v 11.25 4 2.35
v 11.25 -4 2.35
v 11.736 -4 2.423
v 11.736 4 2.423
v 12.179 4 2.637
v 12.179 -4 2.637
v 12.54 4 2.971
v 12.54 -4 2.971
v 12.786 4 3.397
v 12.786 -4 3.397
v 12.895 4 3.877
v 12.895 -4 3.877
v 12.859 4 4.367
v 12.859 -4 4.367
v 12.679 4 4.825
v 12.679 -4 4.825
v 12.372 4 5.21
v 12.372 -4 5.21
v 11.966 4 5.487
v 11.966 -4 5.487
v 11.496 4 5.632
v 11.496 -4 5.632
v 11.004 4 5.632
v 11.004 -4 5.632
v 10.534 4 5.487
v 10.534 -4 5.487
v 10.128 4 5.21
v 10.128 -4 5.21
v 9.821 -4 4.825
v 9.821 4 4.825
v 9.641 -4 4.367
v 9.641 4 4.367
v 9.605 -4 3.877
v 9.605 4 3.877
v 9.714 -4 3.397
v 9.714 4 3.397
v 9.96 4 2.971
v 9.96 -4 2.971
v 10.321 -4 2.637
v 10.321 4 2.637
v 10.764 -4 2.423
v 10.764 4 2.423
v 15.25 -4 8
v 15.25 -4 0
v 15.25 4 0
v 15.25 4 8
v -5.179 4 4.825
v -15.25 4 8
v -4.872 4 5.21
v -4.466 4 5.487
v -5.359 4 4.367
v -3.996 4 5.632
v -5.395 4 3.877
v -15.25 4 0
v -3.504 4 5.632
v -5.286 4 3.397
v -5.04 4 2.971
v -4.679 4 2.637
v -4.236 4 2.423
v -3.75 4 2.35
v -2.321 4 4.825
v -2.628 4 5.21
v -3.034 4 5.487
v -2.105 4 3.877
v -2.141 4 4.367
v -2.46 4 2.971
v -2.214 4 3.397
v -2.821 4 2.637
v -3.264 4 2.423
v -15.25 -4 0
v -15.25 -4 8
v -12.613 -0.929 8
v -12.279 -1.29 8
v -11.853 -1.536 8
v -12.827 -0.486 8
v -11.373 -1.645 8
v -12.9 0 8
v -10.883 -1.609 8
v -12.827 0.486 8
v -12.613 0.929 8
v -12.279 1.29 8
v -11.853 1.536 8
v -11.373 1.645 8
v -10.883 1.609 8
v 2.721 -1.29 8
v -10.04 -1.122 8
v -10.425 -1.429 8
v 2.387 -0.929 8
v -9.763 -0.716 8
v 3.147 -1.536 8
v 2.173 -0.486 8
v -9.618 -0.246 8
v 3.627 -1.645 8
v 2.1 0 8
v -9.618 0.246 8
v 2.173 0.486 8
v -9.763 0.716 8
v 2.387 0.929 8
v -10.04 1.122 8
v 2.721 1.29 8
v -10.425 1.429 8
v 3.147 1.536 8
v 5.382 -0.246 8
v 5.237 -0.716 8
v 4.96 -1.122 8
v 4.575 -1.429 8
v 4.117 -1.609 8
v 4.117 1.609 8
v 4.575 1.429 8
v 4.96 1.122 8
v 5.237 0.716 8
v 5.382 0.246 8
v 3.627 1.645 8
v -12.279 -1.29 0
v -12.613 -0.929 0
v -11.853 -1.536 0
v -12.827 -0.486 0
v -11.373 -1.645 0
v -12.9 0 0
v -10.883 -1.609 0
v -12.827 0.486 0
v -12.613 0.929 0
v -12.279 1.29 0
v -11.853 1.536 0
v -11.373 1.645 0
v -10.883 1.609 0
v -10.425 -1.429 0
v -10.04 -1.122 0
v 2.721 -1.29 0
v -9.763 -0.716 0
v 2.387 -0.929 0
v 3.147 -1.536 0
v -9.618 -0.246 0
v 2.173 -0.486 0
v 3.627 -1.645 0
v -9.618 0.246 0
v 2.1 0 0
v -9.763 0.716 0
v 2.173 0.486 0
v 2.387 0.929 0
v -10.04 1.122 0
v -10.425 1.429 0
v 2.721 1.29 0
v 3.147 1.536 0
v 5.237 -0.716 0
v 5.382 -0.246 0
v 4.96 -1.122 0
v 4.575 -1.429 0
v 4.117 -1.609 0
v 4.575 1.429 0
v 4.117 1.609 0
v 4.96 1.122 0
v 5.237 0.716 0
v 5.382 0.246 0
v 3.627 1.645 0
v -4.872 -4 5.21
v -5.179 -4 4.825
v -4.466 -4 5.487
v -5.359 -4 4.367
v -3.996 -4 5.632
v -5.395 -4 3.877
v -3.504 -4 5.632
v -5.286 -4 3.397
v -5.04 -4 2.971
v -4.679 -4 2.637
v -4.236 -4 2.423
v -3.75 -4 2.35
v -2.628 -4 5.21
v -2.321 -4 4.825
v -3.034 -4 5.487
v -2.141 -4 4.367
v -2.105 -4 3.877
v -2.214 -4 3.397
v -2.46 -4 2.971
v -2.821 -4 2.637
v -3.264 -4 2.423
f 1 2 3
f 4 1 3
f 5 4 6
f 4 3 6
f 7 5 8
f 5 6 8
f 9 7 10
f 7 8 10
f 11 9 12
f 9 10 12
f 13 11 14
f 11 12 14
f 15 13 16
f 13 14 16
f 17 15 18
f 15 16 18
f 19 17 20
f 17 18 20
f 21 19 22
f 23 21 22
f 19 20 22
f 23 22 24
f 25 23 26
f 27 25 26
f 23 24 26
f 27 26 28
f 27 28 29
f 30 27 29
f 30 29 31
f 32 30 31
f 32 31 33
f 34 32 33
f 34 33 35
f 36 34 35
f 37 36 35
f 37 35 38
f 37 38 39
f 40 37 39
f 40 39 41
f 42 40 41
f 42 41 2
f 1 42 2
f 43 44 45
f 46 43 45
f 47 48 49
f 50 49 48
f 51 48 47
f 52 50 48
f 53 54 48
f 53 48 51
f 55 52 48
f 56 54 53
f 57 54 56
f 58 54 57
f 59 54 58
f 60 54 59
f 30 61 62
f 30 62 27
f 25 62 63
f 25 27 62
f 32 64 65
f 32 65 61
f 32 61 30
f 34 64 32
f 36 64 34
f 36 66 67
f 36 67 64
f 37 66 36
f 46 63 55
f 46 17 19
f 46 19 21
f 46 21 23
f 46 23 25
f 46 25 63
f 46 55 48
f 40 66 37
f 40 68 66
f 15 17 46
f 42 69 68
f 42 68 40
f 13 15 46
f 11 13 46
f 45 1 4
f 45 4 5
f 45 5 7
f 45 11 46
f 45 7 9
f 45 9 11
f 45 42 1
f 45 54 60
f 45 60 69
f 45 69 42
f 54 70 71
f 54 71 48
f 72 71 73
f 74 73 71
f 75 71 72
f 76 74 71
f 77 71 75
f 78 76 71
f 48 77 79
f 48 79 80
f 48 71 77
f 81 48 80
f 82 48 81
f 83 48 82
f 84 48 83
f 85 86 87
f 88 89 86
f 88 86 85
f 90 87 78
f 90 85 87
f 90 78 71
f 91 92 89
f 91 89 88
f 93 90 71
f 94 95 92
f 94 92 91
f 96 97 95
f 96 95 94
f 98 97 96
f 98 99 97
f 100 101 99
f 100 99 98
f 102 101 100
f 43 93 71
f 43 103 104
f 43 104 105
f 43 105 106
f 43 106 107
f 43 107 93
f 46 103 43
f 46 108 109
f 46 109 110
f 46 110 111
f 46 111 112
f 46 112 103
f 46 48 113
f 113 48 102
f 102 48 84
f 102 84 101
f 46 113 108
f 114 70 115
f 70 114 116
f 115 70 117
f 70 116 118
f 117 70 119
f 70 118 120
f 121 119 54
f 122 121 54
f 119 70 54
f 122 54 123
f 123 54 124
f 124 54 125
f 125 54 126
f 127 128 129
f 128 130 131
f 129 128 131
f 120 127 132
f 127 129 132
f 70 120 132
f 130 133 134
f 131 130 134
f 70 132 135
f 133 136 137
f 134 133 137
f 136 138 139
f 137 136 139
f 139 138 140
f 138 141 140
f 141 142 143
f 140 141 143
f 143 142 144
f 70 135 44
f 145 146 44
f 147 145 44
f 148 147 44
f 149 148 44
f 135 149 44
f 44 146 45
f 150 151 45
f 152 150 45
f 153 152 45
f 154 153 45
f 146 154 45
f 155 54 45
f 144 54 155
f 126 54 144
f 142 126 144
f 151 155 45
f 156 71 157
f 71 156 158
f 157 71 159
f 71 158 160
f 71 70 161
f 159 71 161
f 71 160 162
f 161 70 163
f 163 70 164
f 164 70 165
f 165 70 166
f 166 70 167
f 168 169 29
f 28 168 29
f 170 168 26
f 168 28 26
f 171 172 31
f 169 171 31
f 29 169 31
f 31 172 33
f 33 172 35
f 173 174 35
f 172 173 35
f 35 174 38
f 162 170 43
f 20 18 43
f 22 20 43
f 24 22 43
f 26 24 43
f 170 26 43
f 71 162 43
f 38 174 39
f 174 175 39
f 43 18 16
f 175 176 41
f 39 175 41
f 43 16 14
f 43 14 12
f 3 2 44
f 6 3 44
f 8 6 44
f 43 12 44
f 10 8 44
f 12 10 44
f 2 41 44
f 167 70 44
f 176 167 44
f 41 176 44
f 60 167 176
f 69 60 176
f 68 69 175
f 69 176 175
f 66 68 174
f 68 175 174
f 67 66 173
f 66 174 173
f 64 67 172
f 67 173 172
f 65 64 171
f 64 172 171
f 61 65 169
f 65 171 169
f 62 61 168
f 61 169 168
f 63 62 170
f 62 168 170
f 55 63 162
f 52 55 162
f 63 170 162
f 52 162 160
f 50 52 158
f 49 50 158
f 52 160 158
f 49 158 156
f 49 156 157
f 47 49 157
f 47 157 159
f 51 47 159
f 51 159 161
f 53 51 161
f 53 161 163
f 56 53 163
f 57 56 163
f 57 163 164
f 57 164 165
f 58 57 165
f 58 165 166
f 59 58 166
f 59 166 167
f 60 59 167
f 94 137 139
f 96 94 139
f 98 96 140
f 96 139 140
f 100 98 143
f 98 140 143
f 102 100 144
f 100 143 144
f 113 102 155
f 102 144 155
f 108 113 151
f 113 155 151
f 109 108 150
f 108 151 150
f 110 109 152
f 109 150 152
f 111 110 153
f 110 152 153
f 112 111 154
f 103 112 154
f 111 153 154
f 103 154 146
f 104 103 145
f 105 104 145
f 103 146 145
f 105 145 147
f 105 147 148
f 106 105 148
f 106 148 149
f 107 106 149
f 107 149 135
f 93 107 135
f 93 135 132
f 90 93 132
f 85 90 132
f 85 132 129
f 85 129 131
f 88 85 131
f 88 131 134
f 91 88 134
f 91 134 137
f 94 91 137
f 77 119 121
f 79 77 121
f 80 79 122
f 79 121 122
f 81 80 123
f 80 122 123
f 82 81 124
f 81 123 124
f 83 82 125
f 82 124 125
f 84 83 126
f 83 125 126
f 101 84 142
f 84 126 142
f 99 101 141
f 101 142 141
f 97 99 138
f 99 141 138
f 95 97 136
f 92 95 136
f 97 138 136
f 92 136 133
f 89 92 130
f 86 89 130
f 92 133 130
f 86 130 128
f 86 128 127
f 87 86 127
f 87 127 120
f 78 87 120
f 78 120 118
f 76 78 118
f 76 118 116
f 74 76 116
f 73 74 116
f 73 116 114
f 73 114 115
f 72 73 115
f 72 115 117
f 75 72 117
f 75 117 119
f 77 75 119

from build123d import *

# Parameters (mm, degrees)
SKETCH_1_W         = 30.5
SKETCH_1_H         = 8
EXTRUDE_1_DEPTH    = 8
HOLE_WIZARD_M4_1_D = 3.3
HOLE_WIZARD_M4_2_D = 3.3


with BuildPart() as part:
    # 草图1 → 凸台-拉伸1 (new body)
    with BuildSketch(Plane.XY):
        Rectangle(SKETCH_1_W, SKETCH_1_H)
    extrude(amount=EXTRUDE_1_DEPTH)

    # M4 螺纹孔1 (through all)
    with Locations(Plane(origin=(3.75, 0, 8), x_dir=(1, 0, 0), z_dir=(0, 0, 1))):
        with Locations((0, 0), (-15, 0)):
            Hole(HOLE_WIZARD_M4_1_D / 2)

    # M4 螺纹孔2 (through all)
    with Locations(Plane(origin=(-3.75, 4, 4), x_dir=(0, 0, 1), z_dir=(0, 1, 0))):
        with Locations((0, 0), (0, 15)):
            Hole(HOLE_WIZARD_M4_2_D / 2)


solid = part.part
